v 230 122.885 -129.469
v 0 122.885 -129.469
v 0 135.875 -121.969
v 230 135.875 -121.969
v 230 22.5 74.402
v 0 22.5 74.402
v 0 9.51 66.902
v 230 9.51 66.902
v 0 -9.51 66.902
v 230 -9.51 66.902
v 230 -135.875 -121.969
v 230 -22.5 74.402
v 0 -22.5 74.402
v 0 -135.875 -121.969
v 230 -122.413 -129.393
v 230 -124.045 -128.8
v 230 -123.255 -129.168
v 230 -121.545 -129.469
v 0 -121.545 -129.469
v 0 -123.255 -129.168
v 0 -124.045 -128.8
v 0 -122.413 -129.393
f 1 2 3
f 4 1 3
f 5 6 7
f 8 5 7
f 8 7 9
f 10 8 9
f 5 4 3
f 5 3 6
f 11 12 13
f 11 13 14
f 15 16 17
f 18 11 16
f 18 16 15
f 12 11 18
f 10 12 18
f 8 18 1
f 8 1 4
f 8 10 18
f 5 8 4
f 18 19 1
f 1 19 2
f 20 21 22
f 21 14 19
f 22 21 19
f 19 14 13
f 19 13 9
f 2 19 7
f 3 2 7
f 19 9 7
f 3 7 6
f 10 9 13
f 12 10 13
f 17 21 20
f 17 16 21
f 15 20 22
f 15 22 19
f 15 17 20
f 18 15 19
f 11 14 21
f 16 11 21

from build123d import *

# Parameters (mm, degrees)
F1_DEPTH = 230
F3_DEPTH = 25
F4_R     = 5


with BuildPart() as f1:
    # F0 (on Right) → F1 (new body)
    with BuildSketch(Plane.YZ):
        Polygon((-2.82824, -129.469417), (2.82824, -129.469417), (122.884619, -129.469417), (135.875, -121.969417), (22.5, 74.401843), (9.509619, 66.901843), (0.683971, 66.901843), (-0.683971, 66.901843), (-9.509619, 66.901843), (-22.5, 74.401843), (-135.875, -121.969417), (-122.884619, -129.469417), align=None)
    extrude(amount=F1_DEPTH)

    # F2 (on face) → F3 (cut)
    with BuildSketch(Plane.XY.offset(66.901843)):
        with BuildLine():
            add(Edge.make_bspline(
                [(74.475423, 192.123339), (93.40541, 192.123339), (83.940416, 223.08819), (74.475423, 254.053041), (65.010429, 223.08819), (55.545435, 192.123339), (74.475423, 192.123339)],
                knots=[0, 0, 0, 2.094395, 2.094395, 4.18879, 4.18879, 6.283185, 6.283185, 6.283185], degree=2, weights=[1, 0.5, 1, 0.5, 1, 0.5, 1]))
        make_face()
        with BuildLine():
            add(Edge.make_bspline(
                [(46.182051, 277.124852), (64.905286, 277.124852), (55.543669, 308.636114), (46.182051, 340.147376), (36.820434, 308.636114), (27.458817, 277.124852), (46.182051, 277.124852)],
                knots=[0, 0, 0, 2.094395, 2.094395, 4.18879, 4.18879, 6.283185, 6.283185, 6.283185], degree=2, weights=[1, 0.5, 1, 0.5, 1, 0.5, 1]))
        make_face()
        with BuildLine():
            add(Edge.make_bspline(
                [(117.583334, 257.453084), (136.293949, 257.453084), (126.938642, 287.325025), (117.583334, 317.196965), (108.228027, 287.325025), (98.87272, 257.453084), (117.583334, 257.453084)],
                knots=[0, 0, 0, 2.094395, 2.094395, 4.18879, 4.18879, 6.283185, 6.283185, 6.283185], degree=2, weights=[1, 0.5, 1, 0.5, 1, 0.5, 1]))
        make_face()
        with BuildLine():
            add(Edge.make_bspline(
                [(184.613109, 237.902731), (202.257195, 237.902731), (193.435152, 268.685415), (184.613109, 299.4681), (175.791065, 268.685415), (166.969022, 237.902731), (184.613109, 237.902731)],
                knots=[0, 0, 0, 2.094395, 2.094395, 4.18879, 4.18879, 6.283185, 6.283185, 6.283185], degree=2, weights=[1, 0.5, 1, 0.5, 1, 0.5, 1]))
        make_face()
        with BuildLine():
            add(Edge.make_bspline(
                [(136.647969, 169.658646), (154.468386, 169.658646), (145.558178, 199.894898), (136.647969, 230.131149), (127.737761, 199.894898), (118.827553, 169.658646), (136.647969, 169.658646)],
                knots=[0, 0, 0, 2.094395, 2.094395, 4.18879, 4.18879, 6.283185, 6.283185, 6.283185], degree=2, weights=[1, 0.5, 1, 0.5, 1, 0.5, 1]))
        make_face()
        with BuildLine():
            add(Edge.make_bspline(
                [(46.182051, -277.124852), (27.458817, -277.124852), (36.820434, -308.636114), (46.182051, -340.147376), (55.543669, -308.636114), (64.905286, -277.124852), (46.182051, -277.124852)],
                knots=[0, 0, 0, 2.094395, 2.094395, 4.18879, 4.18879, 6.283185, 6.283185, 6.283185], degree=2, weights=[1, 0.5, 1, 0.5, 1, 0.5, 1]))
        make_face()
        with BuildLine():
            add(Edge.make_bspline(
                [(74.475423, -192.123339), (55.545435, -192.123339), (65.010429, -223.08819), (74.475423, -254.053041), (83.940416, -223.08819), (93.40541, -192.123339), (74.475423, -192.123339)],
                knots=[0, 0, 0, 2.094395, 2.094395, 4.18879, 4.18879, 6.283185, 6.283185, 6.283185], degree=2, weights=[1, 0.5, 1, 0.5, 1, 0.5, 1]))
        make_face()
        with BuildLine():
            add(Edge.make_bspline(
                [(136.647969, -169.658646), (118.827553, -169.658646), (127.737761, -199.894898), (136.647969, -230.131149), (145.558178, -199.894898), (154.468386, -169.658646), (136.647969, -169.658646)],
                knots=[0, 0, 0, 2.094395, 2.094395, 4.18879, 4.18879, 6.283185, 6.283185, 6.283185], degree=2, weights=[1, 0.5, 1, 0.5, 1, 0.5, 1]))
        make_face()
        with BuildLine():
            add(Edge.make_bspline(
                [(117.583334, -257.453084), (98.87272, -257.453084), (108.228027, -287.325025), (117.583334, -317.196965), (126.938642, -287.325025), (136.293949, -257.453084), (117.583334, -257.453084)],
                knots=[0, 0, 0, 2.094395, 2.094395, 4.18879, 4.18879, 6.283185, 6.283185, 6.283185], degree=2, weights=[1, 0.5, 1, 0.5, 1, 0.5, 1]))
        make_face()
        with BuildLine():
            add(Edge.make_bspline(
                [(184.613109, -237.902731), (166.969022, -237.902731), (175.791065, -268.685415), (184.613109, -299.4681), (193.435152, -268.685415), (202.257195, -237.902731), (184.613109, -237.902731)],
                knots=[0, 0, 0, 2.094395, 2.094395, 4.18879, 4.18879, 6.283185, 6.283185, 6.283185], degree=2, weights=[1, 0.5, 1, 0.5, 1, 0.5, 1]))
        make_face()
    extrude(amount=-F3_DEPTH, mode=Mode.SUBTRACT)

    # F4
    f4_edges = [f1.edges().sort_by_distance(p)[0] for p in [
        (115, -122.884619, -129.469417),
    ]]
    fillet(f4_edges, radius=F4_R)


solid = f1.part
